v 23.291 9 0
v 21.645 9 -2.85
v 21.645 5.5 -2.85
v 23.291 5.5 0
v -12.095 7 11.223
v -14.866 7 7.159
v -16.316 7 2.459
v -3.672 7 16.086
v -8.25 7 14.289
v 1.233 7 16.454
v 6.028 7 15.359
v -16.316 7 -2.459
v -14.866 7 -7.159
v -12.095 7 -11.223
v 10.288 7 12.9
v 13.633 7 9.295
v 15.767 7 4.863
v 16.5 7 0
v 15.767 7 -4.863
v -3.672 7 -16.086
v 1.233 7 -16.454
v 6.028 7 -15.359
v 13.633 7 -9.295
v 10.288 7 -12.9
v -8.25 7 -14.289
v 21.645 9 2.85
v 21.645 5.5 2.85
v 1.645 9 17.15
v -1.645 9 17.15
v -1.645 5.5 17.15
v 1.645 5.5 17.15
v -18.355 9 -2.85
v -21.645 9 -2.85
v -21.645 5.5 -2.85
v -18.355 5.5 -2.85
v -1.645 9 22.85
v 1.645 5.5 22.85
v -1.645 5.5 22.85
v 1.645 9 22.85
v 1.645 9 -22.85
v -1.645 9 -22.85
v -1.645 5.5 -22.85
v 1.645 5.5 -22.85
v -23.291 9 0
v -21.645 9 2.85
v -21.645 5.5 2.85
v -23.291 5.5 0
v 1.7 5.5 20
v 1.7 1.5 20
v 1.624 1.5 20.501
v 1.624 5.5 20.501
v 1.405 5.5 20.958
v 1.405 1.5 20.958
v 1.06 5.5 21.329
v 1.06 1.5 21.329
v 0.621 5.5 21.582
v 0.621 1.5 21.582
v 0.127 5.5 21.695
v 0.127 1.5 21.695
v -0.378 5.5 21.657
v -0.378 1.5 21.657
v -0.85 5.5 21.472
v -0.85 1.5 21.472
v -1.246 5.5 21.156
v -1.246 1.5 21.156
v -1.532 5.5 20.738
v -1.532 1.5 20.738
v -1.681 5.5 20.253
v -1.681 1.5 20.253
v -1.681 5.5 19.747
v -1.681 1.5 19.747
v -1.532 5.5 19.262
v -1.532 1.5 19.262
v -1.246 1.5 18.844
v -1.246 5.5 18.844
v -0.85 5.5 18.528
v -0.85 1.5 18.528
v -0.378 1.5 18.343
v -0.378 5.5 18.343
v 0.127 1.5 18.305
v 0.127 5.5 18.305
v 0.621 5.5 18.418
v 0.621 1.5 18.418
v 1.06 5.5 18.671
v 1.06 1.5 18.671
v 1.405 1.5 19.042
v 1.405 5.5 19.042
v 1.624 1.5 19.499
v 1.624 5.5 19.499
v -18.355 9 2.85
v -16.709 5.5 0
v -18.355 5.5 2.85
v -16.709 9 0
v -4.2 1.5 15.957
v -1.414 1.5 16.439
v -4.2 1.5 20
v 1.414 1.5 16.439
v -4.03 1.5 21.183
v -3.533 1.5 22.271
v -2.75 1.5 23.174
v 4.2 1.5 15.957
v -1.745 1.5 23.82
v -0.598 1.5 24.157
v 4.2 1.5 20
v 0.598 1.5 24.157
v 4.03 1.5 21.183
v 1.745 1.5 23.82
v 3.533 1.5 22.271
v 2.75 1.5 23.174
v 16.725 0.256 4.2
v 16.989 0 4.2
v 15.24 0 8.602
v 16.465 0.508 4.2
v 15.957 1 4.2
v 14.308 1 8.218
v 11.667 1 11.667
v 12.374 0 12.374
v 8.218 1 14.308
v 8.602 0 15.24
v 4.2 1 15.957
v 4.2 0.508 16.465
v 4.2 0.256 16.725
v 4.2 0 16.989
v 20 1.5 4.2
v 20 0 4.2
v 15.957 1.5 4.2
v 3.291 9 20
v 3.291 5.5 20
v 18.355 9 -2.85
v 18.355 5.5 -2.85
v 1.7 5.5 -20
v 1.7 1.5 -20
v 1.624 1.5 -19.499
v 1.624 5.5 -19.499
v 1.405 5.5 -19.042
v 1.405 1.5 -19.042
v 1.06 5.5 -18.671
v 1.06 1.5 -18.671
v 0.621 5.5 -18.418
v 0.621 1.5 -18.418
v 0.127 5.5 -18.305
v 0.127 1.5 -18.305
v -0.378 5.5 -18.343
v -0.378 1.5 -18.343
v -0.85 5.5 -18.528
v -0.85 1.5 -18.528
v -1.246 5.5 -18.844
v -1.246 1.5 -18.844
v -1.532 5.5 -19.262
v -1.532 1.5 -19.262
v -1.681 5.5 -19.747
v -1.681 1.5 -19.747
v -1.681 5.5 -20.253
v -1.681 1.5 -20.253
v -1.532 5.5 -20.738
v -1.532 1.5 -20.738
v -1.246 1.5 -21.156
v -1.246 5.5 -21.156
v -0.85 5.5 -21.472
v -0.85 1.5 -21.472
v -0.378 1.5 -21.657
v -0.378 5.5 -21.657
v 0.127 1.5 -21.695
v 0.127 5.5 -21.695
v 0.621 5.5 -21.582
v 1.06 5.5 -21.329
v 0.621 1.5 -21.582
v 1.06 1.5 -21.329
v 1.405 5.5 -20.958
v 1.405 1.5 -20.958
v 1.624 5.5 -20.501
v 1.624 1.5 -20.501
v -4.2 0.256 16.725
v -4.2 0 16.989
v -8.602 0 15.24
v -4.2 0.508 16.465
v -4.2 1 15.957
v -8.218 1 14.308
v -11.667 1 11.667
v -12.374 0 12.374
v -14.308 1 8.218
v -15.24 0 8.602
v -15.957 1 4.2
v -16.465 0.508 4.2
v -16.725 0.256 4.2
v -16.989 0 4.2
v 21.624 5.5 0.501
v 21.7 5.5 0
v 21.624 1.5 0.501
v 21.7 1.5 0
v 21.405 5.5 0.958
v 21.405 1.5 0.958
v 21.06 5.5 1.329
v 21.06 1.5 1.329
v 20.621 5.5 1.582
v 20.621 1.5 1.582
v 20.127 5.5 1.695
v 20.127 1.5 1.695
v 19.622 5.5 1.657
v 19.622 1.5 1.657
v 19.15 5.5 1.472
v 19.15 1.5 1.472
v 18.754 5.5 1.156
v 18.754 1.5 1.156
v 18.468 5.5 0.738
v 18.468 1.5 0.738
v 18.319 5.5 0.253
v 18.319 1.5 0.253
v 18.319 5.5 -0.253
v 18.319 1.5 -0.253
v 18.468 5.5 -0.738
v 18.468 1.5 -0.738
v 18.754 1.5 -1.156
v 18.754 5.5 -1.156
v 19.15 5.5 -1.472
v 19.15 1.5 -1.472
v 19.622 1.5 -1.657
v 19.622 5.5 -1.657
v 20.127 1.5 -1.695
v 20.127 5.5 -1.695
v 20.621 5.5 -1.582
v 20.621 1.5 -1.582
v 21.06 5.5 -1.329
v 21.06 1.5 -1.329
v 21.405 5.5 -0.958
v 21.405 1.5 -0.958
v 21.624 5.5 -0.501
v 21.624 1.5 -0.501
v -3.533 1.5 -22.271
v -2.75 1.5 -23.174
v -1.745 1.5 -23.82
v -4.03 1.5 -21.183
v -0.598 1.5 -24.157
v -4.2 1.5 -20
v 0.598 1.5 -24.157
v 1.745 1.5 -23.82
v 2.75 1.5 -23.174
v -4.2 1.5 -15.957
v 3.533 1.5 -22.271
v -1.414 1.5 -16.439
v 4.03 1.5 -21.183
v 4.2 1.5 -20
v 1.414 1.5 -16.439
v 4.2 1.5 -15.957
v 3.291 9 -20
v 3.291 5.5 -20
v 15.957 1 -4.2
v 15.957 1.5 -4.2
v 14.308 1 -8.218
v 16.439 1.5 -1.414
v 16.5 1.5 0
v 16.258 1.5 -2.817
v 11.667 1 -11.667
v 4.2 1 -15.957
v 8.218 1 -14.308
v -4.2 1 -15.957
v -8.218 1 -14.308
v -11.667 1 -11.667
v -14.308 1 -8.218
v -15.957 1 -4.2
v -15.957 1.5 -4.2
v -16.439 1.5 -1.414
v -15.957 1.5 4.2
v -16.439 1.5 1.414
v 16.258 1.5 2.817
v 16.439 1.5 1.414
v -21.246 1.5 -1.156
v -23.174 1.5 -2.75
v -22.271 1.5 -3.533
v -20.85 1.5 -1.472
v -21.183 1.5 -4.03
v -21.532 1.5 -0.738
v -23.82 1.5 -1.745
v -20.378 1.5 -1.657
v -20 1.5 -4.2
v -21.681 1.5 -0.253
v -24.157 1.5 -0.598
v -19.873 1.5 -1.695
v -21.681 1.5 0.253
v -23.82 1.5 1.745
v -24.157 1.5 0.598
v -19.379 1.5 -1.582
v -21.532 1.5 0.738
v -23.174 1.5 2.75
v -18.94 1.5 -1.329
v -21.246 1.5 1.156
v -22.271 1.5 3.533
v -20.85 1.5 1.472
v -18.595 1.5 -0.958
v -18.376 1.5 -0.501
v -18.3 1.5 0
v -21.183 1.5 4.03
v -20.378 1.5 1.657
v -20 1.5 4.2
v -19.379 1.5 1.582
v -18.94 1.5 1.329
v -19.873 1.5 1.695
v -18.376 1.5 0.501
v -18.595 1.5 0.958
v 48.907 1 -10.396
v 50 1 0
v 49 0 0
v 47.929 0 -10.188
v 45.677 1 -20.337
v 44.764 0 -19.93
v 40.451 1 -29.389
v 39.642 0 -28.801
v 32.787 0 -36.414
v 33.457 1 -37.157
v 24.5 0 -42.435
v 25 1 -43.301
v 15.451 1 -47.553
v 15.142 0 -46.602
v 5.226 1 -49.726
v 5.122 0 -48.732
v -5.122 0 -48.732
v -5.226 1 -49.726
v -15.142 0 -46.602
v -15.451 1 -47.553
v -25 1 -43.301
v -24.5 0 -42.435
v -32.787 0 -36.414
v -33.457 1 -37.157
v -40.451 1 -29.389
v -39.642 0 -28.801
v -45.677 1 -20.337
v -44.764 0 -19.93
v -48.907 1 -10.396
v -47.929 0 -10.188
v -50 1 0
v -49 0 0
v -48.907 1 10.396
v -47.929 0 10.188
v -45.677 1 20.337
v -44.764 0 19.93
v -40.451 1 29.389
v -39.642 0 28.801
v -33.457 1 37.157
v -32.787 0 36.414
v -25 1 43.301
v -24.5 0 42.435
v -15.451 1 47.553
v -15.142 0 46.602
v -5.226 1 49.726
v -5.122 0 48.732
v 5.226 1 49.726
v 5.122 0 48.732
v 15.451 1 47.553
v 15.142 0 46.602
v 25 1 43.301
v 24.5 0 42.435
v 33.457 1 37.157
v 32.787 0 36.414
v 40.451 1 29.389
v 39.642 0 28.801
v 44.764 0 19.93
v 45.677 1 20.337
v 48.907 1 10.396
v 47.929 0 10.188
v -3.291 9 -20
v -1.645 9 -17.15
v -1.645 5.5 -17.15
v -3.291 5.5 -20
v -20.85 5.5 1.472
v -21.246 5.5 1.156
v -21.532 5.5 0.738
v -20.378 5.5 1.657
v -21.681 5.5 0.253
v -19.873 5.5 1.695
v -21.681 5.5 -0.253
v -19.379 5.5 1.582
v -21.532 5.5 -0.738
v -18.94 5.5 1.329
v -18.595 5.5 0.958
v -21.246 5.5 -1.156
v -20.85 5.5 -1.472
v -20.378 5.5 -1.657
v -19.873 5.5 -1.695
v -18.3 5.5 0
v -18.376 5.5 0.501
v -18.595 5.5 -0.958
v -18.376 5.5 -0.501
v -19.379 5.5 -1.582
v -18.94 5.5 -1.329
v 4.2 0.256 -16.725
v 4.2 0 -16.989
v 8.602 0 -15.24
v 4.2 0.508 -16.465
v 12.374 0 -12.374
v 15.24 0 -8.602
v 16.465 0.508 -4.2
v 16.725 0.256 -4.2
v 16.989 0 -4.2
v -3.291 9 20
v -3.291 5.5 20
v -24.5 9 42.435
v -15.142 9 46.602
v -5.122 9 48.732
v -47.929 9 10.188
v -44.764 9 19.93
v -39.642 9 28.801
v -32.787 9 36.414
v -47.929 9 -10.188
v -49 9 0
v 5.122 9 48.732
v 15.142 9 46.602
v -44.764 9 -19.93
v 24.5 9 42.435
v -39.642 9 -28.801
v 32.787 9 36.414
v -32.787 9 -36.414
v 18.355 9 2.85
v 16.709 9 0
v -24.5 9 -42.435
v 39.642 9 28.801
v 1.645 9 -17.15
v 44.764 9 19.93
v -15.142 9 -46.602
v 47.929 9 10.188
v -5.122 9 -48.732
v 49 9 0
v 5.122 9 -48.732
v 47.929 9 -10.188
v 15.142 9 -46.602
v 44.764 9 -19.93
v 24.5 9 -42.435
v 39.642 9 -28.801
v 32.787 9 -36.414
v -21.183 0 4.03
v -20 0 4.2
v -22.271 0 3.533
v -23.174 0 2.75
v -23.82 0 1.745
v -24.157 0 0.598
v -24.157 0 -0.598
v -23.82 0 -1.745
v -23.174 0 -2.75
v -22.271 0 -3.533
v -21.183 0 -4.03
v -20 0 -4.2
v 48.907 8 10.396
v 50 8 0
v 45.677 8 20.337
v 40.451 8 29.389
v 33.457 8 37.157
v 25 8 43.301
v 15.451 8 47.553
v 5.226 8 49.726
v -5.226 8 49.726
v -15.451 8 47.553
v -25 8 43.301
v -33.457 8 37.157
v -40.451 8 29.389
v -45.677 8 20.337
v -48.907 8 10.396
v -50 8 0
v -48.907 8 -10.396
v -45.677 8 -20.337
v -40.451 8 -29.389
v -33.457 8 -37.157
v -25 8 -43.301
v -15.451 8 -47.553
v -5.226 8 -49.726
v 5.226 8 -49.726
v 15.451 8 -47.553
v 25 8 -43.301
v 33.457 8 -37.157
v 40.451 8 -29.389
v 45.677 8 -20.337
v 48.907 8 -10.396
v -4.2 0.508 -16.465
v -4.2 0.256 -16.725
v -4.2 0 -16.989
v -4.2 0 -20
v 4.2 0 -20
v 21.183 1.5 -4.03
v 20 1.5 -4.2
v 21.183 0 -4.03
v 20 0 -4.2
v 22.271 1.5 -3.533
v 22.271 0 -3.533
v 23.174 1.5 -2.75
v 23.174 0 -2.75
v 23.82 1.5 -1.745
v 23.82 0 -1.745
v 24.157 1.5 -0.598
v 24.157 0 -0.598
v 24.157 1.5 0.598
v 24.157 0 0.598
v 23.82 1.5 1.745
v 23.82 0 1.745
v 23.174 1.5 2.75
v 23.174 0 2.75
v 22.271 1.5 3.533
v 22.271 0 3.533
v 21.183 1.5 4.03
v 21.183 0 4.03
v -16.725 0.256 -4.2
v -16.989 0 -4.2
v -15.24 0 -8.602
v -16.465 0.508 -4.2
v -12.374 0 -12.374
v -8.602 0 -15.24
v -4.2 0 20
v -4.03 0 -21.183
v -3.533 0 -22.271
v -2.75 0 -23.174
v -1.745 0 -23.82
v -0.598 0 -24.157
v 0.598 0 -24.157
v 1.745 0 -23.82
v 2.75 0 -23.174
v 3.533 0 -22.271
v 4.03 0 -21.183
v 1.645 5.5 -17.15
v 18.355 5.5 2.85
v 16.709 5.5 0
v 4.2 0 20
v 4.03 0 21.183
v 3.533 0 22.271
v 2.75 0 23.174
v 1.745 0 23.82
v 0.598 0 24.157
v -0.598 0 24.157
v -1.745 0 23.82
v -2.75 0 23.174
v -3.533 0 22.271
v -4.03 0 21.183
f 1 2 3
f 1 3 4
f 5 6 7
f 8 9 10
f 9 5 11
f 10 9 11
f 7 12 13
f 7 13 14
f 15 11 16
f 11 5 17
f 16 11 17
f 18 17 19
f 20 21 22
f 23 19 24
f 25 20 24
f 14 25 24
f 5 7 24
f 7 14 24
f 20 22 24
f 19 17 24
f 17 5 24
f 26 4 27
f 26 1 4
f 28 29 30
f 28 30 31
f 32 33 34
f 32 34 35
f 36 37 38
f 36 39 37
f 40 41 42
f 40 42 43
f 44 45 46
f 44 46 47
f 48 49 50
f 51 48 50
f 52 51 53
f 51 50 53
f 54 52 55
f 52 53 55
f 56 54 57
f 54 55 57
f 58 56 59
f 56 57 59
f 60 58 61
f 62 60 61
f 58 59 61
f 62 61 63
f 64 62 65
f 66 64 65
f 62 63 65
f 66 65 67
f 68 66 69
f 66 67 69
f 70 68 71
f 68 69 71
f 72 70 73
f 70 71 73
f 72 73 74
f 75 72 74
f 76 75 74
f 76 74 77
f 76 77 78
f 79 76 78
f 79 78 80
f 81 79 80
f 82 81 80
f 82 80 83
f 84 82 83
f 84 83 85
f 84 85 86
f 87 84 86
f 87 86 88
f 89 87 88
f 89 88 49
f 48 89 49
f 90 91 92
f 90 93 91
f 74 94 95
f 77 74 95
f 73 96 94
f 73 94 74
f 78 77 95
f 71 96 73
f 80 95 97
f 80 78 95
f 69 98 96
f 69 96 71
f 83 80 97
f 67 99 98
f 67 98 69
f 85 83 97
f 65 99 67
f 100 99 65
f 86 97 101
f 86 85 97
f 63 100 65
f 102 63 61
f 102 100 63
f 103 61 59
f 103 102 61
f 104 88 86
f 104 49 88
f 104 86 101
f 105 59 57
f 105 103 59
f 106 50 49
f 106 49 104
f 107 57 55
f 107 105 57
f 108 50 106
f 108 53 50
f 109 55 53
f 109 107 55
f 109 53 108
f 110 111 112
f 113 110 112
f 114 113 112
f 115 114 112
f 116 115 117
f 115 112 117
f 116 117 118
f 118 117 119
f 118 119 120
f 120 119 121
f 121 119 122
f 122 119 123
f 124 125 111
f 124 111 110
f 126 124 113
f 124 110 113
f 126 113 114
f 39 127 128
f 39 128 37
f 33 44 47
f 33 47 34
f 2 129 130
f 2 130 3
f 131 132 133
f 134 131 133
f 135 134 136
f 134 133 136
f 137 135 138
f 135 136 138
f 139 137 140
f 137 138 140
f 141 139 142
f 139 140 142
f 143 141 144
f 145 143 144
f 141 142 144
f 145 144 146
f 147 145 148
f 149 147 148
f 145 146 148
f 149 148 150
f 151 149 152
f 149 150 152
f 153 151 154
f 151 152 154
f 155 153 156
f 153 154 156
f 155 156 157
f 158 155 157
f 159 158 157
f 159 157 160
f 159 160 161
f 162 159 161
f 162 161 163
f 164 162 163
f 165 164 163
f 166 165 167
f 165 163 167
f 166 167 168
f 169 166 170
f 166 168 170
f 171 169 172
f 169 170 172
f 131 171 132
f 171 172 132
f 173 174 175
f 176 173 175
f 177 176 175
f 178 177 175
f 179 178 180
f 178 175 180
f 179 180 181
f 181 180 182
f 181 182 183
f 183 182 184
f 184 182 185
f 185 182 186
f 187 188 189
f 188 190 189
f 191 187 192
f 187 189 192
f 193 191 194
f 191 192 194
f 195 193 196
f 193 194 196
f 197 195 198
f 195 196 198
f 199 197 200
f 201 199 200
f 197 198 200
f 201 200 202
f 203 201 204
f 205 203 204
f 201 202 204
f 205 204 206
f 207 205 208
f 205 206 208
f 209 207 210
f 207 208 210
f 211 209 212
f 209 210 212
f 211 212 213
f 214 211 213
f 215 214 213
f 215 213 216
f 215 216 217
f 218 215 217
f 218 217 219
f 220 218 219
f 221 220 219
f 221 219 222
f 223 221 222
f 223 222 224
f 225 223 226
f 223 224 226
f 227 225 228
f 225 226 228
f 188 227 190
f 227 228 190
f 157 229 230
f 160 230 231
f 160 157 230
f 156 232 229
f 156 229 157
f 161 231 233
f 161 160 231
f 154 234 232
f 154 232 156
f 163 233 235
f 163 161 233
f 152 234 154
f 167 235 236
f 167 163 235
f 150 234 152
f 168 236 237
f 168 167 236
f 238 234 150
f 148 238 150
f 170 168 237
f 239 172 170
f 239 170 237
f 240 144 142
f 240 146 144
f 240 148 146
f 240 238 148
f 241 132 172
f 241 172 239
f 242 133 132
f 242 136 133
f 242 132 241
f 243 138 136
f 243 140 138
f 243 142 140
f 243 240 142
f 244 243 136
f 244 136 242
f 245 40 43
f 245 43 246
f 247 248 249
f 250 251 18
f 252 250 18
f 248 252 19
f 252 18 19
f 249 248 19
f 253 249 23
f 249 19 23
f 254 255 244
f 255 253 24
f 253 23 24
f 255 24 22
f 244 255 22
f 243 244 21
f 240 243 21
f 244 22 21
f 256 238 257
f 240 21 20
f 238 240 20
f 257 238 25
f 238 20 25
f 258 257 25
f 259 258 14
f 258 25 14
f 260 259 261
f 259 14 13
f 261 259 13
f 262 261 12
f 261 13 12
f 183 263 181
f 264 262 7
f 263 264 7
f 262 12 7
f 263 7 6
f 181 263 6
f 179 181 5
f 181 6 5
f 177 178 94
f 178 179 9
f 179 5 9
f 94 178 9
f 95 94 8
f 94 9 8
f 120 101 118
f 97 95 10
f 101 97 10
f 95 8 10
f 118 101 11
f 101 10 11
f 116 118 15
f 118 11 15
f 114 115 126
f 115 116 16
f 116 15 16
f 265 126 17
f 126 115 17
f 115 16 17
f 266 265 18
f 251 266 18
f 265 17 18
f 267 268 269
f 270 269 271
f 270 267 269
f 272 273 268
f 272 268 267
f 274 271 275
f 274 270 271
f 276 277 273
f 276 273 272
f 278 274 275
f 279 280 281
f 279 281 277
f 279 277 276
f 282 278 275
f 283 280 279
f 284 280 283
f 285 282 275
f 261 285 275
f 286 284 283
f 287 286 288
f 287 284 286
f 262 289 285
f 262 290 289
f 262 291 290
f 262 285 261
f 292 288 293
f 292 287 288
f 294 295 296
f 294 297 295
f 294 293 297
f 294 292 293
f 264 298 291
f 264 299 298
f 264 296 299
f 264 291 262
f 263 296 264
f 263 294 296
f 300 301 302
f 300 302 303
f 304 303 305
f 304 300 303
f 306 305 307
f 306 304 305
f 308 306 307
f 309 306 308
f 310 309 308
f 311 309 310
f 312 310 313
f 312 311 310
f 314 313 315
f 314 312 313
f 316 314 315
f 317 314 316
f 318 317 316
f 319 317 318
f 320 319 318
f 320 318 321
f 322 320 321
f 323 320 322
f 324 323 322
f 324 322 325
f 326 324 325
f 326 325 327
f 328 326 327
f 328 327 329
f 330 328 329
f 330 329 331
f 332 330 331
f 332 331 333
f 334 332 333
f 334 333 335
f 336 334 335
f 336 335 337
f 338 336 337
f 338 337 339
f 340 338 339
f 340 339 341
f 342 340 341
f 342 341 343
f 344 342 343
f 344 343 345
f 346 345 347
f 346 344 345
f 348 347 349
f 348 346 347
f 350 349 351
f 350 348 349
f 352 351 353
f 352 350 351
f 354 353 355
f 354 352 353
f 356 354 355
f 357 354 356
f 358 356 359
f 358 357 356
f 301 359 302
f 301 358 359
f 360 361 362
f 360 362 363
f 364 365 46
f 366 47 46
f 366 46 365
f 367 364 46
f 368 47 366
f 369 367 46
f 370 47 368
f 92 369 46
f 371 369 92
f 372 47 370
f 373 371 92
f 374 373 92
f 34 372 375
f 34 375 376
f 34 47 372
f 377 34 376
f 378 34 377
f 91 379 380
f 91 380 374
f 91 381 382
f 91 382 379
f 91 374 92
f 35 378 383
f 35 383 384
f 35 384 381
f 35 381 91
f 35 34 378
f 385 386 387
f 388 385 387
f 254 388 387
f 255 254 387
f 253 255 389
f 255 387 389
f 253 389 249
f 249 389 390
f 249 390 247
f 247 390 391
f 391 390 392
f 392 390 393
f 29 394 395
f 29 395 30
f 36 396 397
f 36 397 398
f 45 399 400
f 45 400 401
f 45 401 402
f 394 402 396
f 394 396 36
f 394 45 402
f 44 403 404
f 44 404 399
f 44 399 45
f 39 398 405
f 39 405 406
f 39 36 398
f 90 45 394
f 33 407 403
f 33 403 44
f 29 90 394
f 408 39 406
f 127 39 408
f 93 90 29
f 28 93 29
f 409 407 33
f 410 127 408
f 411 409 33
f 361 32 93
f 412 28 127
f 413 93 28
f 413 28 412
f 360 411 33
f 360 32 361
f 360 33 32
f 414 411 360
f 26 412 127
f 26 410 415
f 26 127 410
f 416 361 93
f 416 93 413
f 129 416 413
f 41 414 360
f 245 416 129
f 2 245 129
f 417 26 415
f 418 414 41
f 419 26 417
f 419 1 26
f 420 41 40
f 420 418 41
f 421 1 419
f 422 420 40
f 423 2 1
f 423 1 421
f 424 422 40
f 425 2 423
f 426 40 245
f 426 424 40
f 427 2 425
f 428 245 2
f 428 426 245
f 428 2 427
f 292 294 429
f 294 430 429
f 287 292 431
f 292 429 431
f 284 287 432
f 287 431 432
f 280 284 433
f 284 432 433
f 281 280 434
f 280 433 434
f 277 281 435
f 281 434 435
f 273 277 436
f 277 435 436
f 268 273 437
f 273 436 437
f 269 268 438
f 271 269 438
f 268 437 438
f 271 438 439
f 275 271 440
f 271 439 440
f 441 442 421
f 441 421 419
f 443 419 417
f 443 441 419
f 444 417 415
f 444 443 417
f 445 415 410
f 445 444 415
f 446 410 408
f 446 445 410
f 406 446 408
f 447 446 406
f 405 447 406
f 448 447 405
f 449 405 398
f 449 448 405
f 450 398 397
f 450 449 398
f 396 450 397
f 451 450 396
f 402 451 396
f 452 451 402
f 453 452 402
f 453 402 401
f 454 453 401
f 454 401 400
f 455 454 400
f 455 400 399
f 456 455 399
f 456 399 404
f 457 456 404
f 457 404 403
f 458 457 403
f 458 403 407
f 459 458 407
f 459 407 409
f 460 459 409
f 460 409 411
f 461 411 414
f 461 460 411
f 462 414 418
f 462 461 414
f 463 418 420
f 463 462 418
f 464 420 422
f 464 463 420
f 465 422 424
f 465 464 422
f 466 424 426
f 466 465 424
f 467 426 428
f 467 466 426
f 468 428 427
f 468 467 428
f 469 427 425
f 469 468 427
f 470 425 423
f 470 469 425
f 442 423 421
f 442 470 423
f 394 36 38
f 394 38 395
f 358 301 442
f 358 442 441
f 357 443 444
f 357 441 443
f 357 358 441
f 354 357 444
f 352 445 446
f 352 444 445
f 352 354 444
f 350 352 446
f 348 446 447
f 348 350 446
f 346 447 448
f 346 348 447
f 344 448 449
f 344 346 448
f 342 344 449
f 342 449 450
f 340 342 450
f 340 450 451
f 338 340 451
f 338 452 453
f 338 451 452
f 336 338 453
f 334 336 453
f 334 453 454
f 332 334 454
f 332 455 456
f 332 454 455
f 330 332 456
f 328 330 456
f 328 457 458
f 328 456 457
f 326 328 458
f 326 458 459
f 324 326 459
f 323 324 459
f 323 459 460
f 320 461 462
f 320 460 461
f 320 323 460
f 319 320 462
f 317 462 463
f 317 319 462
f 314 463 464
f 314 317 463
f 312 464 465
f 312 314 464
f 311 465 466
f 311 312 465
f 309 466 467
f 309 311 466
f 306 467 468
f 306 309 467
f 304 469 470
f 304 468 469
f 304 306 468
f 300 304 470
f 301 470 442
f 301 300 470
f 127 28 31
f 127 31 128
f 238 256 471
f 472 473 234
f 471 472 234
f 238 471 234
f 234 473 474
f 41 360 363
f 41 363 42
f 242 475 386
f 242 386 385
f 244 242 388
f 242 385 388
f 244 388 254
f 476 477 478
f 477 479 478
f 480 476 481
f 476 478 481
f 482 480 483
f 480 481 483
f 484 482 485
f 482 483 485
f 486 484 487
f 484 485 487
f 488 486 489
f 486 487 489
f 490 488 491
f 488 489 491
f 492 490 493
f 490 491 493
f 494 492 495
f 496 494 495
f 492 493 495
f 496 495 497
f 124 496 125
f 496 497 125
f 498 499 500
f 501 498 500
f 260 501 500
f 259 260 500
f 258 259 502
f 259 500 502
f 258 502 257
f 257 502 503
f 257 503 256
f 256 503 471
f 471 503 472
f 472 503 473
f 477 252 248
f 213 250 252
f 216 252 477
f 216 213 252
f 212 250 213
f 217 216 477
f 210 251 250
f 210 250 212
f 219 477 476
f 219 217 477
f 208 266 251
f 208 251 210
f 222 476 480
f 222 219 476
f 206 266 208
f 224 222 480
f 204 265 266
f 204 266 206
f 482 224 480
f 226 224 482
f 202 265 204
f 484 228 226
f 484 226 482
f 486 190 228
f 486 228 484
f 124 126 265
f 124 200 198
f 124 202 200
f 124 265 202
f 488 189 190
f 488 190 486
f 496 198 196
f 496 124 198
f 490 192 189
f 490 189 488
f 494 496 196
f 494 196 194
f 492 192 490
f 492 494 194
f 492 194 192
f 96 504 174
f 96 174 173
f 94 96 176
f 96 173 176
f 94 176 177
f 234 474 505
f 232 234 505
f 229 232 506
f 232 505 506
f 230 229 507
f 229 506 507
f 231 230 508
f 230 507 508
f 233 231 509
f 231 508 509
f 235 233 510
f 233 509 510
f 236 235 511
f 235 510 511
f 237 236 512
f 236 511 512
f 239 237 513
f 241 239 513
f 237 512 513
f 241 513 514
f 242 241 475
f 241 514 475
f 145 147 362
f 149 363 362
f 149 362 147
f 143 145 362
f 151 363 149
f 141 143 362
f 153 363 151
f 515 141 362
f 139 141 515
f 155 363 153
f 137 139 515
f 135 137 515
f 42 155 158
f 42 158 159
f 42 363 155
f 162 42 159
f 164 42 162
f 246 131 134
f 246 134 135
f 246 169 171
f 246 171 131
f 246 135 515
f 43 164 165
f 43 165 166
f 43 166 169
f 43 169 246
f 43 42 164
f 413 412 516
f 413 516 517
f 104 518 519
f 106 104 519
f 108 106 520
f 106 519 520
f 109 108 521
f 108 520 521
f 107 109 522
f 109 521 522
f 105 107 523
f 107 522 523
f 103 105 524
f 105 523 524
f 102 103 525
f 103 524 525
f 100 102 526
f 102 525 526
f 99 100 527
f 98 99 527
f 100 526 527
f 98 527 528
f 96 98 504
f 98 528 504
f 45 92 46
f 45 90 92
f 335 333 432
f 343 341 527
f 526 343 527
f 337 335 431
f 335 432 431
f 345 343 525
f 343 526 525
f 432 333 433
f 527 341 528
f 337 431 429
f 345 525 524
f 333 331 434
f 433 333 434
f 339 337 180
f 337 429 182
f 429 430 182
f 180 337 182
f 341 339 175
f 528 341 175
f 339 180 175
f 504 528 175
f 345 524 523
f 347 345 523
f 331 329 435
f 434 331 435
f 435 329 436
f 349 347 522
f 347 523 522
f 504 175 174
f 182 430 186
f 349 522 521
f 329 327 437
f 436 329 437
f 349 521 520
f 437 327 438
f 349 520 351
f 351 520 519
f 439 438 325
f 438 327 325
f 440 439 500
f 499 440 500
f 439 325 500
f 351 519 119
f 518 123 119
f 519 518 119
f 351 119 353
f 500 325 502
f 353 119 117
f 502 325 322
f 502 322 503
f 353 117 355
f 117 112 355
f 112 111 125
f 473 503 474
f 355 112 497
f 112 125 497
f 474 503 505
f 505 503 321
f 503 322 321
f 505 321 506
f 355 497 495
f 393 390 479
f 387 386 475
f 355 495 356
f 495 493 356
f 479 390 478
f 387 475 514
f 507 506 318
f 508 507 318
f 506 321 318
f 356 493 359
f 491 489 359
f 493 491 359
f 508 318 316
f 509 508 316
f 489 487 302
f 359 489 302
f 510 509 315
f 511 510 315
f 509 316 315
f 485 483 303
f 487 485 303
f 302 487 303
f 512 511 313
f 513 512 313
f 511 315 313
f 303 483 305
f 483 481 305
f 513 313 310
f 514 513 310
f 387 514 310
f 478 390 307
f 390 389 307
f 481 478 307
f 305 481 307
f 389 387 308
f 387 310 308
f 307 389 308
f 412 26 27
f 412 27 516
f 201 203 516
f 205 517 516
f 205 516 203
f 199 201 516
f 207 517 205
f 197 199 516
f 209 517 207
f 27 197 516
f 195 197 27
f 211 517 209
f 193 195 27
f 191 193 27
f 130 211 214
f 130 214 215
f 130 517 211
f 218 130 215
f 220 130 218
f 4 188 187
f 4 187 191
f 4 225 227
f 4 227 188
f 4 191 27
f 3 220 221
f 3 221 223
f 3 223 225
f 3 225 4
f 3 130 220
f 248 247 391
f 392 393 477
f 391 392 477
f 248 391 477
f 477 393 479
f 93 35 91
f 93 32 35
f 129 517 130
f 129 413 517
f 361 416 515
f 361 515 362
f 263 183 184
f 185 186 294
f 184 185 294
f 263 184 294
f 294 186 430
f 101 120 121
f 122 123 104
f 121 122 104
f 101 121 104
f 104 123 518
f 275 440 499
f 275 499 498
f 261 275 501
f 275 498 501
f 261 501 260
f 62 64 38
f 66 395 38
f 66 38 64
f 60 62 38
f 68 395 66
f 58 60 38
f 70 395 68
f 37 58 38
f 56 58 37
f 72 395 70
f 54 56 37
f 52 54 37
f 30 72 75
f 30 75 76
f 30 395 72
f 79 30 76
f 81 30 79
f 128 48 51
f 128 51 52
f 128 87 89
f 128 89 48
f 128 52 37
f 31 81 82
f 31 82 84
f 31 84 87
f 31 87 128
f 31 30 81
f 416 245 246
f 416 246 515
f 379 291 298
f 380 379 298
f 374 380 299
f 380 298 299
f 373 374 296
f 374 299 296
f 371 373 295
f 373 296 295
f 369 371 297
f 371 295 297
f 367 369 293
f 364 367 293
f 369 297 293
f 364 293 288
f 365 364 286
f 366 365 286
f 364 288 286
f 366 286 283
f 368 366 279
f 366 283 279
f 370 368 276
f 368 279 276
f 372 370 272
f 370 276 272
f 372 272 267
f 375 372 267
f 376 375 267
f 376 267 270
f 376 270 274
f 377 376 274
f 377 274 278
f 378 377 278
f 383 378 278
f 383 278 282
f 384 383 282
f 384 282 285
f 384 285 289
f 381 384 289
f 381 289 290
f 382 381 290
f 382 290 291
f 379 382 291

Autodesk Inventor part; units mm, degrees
ref_plane "YZ Plane" through (0, 0, 0) normal (1, 0, 0) x (0, 1, 0)
ref_plane "XZ Plane" through (0, 0, 0) normal (0, 1, 0) x (-1, 0, 0)
ref_plane "XY Plane" through (0, 0, 0) normal (0, 0, 1) x (1, 0, 0)
sketch "Sketch1" plane through (0, 0, 0) normal (0, 0, 1) x (1, 0, 0)
  line L0 (0, 0) -> (16.5, 0) construction
  line L1 (16.5, 0) -> (16.5, 7)
  line L2 (16.5, 7) -> (0, 7)
  line L3 (0, 7) -> (0, 9)
  line L4 (0, 9) -> (50, 9)
  line L5 (50, 9) -> (50, 0)
  line L6 (50, 0) -> (16.5, 0)
  line L7 (0, 7) -> (0, 0) construction
  dimension "d0" = 16.5
  dimension "d1" = 7
  dimension "d2" = 2
  dimension "d3" = 50
revolve "Revolution1" add sketch "Sketch1" angle 360 about axis through (0, 7, 0) along (0, 1, 0)
sketch "Sketch2" plane through (0, 0, 0) normal (0, -1, 0) x (1, 0, 0)
  line L0 (0, 20) -> (0, -20) construction
  line L1 (-4.2, 20) -> (-4.2, -20)
  line L2 (4.2, -20) -> (4.2, 20)
  arc A0 (4.2, 20) -> (-4.2, 20) centre (0, 20) ccw
  arc A1 (-4.2, -20) -> (4.2, -20) centre (0, -20) ccw
  line L3 (-20, 0) -> (20, 0) construction
  line L4 (-20, -4.2) -> (20, -4.2)
  line L5 (20, 4.2) -> (-20, 4.2)
  arc A2 (-20, 4.2) -> (-20, -4.2) centre (-20, 0) ccw
  arc A3 (20, -4.2) -> (20, 4.2) centre (20, 0) ccw
  point P0 (0, 0)
  point P1 (4.2, 4.2)
  point P2 (-4.2, 4.2)
  point P3 (-4.2, -4.2)
  point P4 (4.2, -4.2)
  dimension "d5" = 4.2
  dimension "d6" = 40
  dimension "d7" = 40
extrude "Extrusion1" cut sketch "Sketch2" against normal blind 1.5
sketch "Sketch3" plane through (0, 1.5, 0) normal (0, -1, 0) x (1, 0, 0)
  arc A0 (4.2, 20) -> (-4.2, 20) centre (0, 20) ccw projected
  circle A1 centre (0, 20) radius 1.7
  arc A2 (20, -4.2) -> (20, 4.2) centre (20, 0) ccw projected
  circle A3 centre (20, 0) radius 1.7
  arc A4 (-4.2, -20) -> (4.2, -20) centre (0, -20) ccw projected
  circle A5 centre (0, -20) radius 1.7
  arc A6 (-20, 4.2) -> (-20, -4.2) centre (-20, 0) ccw projected
  circle A7 centre (-20, 0) radius 1.7
  point P0 (0, 0)
  dimension "d10" = 3.4
extrude "Extrusion2" cut sketch "Sketch3" against normal through all
sketch "Sketch4" plane through (0, 9, 0) normal (0, 1, 0) x (1, 0, 0)
  circle A0 centre (0, -20) radius 1.7 projected
  line L0 (-1.6454, -17.15) -> (1.6454, -17.15)
  line L1 (1.6454, -17.15) -> (3.2909, -20)
  line L2 (3.2909, -20) -> (1.6454, -22.85)
  line L3 (1.6454, -22.85) -> (-1.6454, -22.85)
  line L4 (-1.6454, -22.85) -> (-3.2909, -20)
  line L5 (-3.2909, -20) -> (-1.6454, -17.15)
  circle A1 centre (0, 20) radius 1.7 projected
  line L6 (-1.6454, 17.15) -> (-3.2909, 20)
  line L7 (-3.2909, 20) -> (-1.6454, 22.85)
  line L8 (-1.6454, 22.85) -> (1.6454, 22.85)
  line L9 (1.6454, 22.85) -> (3.2909, 20)
  line L10 (3.2909, 20) -> (1.6454, 17.15)
  line L11 (1.6454, 17.15) -> (-1.6454, 17.15)
  circle A2 centre (20, 0) radius 1.7 projected
  line L12 (21.6454, 2.85) -> (23.2909, 0)
  line L13 (23.2909, 0) -> (21.6454, -2.85)
  line L14 (21.6454, -2.85) -> (18.3546, -2.85)
  line L15 (18.3546, -2.85) -> (16.7091, 0)
  line L16 (16.7091, 0) -> (18.3546, 2.85)
  line L17 (18.3546, 2.85) -> (21.6454, 2.85)
  circle A3 centre (-20, 0) radius 1.7 projected
  line L18 (-21.6454, 2.85) -> (-18.3546, 2.85)
  line L19 (-18.3546, 2.85) -> (-16.7091, 0)
  line L20 (-16.7091, 0) -> (-18.3546, -2.85)
  line L21 (-18.3546, -2.85) -> (-21.6454, -2.85)
  line L22 (-21.6454, -2.85) -> (-23.2909, 0)
  line L23 (-23.2909, 0) -> (-21.6454, 2.85)
  point P0 (0, 0)
  point P1 (0, -20)
  point P2 (0, 20)
  dimension "d13" = 5.7
extrude "Extrusion3" cut sketch "Sketch4" against normal blind 3.5 contours A0 | L0 L1 L2 L3 L4 L5 | A1 | L6 L7 L8 L9 L10 L11 | A2 | L12 L13 L14 L15 L16 L17 | A3 | L18 L19 L20 L21 L22 L23
chamfer "Chamfer1" distance 1 angle 45 2 edges at (-50, 0, 0) (-50, 9, 0)
chamfer "Chamfer2" distance 1 angle 45 4 edges at (-11.6673, 0, -11.6673) (-11.6673, 0, 11.6673) (11.6673, 0, 11.6673) (11.6673, 0, -11.6673)
properties part number "Platform"
